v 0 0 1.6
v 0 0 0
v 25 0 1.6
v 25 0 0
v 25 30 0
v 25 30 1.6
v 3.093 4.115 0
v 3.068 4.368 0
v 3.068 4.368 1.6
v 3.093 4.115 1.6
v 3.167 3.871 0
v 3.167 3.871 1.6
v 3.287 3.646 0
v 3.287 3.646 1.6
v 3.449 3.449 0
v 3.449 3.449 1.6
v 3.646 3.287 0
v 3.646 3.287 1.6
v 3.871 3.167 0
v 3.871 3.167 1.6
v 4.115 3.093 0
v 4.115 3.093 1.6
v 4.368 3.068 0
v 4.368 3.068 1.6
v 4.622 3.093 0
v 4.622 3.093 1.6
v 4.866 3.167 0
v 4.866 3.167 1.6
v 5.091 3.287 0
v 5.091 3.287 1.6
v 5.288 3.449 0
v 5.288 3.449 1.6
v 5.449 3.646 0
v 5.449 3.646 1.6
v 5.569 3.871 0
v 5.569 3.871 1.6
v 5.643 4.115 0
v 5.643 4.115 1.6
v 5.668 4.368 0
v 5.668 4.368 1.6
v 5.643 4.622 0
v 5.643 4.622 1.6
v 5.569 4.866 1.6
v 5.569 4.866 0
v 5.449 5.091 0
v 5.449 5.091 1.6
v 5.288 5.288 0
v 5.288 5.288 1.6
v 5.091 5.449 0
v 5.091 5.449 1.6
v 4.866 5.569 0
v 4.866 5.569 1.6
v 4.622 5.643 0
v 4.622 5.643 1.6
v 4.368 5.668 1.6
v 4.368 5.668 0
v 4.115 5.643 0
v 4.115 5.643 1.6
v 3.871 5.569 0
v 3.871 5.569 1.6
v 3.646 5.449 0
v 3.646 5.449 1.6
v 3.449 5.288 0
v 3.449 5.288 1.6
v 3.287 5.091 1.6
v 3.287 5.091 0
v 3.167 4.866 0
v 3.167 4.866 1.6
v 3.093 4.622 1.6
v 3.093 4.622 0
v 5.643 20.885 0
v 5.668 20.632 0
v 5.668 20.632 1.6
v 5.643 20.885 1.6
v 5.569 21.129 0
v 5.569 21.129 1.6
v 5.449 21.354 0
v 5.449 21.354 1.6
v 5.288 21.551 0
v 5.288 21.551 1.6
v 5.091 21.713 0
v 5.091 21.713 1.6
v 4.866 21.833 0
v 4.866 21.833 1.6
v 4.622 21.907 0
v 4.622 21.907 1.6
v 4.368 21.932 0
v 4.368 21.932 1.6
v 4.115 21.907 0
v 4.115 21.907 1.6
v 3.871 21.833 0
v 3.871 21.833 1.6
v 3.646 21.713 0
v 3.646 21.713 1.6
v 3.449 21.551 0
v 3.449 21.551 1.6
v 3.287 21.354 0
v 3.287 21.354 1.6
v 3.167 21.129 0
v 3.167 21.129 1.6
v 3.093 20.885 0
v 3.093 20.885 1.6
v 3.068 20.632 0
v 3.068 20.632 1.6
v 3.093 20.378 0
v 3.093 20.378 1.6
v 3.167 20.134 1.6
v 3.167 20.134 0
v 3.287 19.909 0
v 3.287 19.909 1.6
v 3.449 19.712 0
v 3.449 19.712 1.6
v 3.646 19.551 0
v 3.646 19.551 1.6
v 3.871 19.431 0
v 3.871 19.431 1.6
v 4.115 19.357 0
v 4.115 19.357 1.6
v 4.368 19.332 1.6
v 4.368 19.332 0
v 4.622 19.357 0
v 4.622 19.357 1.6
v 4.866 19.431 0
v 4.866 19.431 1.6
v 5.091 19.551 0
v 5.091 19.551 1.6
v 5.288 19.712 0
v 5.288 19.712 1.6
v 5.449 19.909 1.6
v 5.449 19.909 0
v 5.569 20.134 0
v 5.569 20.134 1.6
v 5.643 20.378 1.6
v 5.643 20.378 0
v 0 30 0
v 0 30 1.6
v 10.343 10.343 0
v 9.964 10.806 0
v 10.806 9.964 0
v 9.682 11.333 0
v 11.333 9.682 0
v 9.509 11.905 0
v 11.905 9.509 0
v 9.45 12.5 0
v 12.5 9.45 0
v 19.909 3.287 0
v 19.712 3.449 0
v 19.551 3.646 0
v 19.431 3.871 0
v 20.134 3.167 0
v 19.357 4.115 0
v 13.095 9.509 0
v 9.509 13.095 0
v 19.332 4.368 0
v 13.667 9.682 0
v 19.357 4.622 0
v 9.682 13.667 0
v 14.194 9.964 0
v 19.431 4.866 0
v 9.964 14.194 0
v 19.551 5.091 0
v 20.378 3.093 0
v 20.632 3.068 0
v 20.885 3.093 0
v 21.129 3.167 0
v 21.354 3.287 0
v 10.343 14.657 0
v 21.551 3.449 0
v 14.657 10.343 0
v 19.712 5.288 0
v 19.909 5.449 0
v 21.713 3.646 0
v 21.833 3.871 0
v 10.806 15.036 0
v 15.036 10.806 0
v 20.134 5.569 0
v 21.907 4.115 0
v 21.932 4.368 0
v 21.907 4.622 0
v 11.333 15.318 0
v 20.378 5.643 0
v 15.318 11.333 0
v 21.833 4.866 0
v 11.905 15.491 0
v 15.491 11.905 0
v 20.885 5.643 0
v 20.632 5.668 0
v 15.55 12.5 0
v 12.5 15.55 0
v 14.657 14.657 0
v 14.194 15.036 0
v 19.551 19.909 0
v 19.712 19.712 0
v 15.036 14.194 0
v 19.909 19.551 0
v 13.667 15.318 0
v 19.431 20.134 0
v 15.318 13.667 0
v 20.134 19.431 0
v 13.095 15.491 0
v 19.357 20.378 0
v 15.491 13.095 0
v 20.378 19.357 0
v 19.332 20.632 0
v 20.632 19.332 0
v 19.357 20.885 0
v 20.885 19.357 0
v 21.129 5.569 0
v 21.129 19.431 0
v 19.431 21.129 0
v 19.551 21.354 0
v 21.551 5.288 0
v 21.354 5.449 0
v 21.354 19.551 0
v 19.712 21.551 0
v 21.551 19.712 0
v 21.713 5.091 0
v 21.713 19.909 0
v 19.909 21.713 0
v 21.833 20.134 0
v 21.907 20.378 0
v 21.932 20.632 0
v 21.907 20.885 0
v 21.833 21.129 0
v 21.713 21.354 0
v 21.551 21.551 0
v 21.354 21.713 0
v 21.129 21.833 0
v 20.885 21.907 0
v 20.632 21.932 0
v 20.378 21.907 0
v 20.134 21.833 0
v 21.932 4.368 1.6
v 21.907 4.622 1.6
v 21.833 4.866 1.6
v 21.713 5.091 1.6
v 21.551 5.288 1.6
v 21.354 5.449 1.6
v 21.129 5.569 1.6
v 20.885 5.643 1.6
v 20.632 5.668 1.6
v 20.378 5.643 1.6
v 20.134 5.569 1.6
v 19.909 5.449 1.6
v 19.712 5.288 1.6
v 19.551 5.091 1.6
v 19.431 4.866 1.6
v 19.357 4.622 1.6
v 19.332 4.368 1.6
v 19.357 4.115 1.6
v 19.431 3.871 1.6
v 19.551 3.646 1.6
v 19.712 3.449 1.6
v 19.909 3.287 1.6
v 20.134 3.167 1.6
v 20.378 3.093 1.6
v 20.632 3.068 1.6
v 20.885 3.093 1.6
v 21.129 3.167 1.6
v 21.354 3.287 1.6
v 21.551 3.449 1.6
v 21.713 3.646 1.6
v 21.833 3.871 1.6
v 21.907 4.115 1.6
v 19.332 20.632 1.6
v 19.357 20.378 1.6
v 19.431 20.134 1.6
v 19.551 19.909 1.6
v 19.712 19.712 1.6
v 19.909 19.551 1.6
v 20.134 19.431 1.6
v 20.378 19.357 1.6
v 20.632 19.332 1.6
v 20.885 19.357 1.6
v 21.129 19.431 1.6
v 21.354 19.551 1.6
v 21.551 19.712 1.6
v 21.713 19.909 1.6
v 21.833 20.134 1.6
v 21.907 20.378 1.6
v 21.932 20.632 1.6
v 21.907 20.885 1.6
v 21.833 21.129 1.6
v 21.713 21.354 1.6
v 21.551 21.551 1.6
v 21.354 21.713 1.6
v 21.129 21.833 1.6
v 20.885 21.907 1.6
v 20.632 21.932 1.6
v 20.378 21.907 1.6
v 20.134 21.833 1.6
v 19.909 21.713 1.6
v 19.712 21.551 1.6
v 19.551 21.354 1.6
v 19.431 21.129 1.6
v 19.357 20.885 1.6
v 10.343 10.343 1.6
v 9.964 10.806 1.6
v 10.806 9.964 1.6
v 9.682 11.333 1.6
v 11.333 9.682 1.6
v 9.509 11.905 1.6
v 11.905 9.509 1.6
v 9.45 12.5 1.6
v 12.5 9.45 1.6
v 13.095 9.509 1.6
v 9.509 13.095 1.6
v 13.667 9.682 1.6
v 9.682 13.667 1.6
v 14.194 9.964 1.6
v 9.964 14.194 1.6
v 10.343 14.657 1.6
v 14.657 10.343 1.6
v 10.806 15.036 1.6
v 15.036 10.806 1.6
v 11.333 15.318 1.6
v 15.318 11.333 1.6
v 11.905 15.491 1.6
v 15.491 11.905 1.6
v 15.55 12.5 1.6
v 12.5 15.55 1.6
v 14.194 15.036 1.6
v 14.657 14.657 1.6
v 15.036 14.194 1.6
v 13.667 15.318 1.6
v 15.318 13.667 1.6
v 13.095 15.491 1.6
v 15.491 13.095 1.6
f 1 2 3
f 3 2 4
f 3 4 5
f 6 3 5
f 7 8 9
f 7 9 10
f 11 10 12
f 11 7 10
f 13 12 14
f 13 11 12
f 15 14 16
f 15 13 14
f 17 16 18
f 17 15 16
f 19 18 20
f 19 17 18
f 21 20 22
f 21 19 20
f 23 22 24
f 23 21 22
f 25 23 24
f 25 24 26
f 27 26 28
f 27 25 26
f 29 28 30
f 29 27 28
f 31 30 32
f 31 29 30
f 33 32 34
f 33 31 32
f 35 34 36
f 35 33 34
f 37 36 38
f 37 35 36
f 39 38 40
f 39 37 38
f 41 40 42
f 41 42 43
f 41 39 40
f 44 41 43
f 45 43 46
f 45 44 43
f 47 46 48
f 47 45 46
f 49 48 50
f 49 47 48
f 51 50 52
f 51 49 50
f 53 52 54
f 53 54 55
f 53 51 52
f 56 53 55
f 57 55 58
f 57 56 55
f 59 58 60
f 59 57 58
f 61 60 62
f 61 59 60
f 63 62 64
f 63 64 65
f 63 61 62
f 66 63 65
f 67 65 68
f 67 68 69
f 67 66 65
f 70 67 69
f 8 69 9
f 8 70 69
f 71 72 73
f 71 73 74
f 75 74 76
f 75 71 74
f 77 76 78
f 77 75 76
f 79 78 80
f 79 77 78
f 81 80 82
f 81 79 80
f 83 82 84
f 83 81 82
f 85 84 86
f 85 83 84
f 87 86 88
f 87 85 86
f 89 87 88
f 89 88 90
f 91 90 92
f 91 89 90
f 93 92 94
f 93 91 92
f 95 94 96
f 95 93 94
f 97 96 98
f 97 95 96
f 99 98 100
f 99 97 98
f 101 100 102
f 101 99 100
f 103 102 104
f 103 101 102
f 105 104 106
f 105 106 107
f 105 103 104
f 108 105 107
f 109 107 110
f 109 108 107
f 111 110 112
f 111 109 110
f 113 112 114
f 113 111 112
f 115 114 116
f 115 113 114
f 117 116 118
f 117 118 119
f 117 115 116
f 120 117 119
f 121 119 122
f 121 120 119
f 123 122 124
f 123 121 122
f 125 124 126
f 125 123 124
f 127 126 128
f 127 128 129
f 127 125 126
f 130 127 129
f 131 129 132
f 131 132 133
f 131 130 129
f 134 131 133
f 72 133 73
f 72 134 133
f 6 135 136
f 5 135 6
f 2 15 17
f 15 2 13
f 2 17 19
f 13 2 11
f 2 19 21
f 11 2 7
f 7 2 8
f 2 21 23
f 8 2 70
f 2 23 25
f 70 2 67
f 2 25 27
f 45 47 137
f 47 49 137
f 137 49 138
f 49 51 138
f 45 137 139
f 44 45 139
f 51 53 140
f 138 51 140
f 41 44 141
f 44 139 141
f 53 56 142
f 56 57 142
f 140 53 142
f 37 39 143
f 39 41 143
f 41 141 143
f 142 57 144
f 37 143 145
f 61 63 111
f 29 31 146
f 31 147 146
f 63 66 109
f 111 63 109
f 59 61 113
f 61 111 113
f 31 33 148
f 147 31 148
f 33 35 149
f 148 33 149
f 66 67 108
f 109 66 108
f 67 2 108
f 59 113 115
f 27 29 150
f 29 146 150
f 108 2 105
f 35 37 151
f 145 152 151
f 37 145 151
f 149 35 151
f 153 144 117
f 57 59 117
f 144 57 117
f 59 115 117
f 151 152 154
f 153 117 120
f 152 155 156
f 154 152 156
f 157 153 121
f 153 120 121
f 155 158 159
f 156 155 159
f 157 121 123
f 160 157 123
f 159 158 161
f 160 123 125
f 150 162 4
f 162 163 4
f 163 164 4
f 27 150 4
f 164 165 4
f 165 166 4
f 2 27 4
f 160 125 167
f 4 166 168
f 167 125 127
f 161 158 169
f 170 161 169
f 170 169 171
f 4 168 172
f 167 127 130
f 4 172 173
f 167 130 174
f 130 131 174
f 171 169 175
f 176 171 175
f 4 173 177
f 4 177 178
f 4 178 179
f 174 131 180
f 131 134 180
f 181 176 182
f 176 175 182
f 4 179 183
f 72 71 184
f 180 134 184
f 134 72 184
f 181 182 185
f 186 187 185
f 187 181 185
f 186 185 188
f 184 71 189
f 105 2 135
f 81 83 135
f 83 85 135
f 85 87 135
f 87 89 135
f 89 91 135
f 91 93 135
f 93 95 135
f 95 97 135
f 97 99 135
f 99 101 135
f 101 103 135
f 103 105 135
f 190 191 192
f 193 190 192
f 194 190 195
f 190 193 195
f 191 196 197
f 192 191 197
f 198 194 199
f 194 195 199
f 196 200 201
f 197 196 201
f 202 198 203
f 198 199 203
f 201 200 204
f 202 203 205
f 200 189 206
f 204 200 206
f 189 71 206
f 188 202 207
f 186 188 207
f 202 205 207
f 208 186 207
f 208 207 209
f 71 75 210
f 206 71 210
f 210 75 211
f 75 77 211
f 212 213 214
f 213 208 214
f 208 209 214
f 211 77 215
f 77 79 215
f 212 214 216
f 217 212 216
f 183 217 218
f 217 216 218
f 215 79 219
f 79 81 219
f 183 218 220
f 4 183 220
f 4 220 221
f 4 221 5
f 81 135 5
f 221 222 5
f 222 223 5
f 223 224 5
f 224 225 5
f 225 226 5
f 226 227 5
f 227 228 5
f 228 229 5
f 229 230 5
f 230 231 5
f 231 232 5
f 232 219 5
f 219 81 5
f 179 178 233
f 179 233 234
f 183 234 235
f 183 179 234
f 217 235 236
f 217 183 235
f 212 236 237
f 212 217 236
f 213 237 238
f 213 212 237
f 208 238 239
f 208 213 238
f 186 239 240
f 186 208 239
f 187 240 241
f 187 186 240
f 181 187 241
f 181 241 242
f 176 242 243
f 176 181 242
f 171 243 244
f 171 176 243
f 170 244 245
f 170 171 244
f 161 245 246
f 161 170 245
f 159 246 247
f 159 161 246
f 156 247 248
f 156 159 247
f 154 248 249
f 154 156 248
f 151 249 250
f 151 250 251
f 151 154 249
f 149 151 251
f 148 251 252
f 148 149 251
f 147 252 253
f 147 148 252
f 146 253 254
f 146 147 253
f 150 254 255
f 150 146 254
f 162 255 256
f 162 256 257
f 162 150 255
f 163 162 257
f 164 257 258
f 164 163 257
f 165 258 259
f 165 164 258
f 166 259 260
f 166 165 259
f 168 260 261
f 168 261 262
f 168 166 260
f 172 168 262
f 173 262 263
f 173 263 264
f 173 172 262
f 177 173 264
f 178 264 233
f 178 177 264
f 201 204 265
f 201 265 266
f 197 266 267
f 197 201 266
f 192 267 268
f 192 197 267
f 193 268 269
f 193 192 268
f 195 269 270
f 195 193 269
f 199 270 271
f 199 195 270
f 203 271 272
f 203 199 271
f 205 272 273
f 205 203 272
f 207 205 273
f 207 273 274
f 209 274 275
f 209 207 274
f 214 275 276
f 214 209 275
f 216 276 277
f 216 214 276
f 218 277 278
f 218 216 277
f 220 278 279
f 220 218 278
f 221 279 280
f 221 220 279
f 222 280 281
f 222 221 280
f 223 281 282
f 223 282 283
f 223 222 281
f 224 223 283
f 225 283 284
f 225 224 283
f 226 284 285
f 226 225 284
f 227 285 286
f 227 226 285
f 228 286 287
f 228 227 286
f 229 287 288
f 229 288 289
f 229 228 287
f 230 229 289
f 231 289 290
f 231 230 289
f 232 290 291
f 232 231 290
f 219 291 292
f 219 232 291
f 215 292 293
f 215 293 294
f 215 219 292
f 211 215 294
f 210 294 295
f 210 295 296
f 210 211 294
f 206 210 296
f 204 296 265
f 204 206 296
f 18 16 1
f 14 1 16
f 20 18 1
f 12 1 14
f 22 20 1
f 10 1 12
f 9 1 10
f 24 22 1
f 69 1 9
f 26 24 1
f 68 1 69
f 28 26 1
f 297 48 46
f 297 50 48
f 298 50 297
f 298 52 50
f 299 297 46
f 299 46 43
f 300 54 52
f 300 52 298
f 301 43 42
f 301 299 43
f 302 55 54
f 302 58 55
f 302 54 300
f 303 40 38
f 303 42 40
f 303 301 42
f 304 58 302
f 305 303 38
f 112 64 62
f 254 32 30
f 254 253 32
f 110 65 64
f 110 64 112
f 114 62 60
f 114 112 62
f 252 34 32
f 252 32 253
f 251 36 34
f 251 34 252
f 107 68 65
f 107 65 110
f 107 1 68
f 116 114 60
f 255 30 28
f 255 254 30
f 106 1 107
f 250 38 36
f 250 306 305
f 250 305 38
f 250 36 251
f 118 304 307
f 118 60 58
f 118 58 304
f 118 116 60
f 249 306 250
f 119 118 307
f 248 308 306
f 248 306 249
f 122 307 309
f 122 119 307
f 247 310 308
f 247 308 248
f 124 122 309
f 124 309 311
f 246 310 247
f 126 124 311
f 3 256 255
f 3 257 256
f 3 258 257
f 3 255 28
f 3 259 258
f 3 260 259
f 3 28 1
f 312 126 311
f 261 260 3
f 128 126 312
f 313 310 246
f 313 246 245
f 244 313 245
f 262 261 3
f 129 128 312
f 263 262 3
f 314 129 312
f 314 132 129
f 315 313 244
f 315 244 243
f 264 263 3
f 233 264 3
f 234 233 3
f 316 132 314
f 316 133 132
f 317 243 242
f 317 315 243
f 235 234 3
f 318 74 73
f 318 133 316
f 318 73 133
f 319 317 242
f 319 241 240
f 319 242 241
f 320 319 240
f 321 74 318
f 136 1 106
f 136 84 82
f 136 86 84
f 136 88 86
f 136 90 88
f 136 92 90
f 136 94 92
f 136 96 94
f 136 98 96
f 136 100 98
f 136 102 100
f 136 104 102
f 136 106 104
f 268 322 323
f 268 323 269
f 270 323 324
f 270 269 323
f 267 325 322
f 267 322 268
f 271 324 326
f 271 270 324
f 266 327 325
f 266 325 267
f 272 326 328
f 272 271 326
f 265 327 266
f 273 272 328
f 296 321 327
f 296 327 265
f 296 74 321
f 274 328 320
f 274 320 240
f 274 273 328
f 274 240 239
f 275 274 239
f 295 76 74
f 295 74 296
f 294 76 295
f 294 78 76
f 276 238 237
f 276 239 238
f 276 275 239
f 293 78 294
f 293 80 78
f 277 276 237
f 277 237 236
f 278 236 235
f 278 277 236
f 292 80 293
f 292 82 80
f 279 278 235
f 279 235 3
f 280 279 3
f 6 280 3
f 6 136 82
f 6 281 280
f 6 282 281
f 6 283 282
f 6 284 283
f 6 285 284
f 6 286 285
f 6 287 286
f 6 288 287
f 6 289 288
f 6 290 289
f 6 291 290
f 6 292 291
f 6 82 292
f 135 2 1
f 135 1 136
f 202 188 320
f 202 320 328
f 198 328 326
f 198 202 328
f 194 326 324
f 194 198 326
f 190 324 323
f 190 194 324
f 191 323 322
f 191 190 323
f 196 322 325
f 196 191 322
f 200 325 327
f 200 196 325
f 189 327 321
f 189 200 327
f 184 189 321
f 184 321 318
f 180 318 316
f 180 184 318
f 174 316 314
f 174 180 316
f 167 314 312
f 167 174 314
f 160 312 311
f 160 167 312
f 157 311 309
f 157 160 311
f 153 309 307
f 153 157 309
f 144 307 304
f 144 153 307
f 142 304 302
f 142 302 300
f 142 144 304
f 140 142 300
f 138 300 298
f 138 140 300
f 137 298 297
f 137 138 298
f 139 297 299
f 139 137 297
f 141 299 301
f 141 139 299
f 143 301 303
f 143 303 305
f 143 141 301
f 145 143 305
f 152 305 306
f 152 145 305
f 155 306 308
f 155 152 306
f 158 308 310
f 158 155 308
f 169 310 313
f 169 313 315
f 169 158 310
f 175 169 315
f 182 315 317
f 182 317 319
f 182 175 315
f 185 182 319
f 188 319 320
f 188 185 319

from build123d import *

# Parameters (mm, degrees)
SKETCH_1_W      = 25
SKETCH_1_H      = 30
SKETCH_1_R      = 1.3
SKETCH_1_R_2    = 3.05
EXTRUDE_1_DEPTH = 1.6


with BuildPart() as part:
    # 草图1 → 凸台-拉伸1 (new body)
    with BuildSketch(Plane.XY):
        with Locations((12.5, 15)):
            Rectangle(SKETCH_1_W, SKETCH_1_H)
        with Locations((4.368272016, 20.631727984)):
            Circle(SKETCH_1_R, mode=Mode.SUBTRACT)
        with Locations(Location((20.631727984, 20.631727984, 0), (0, 0, 180))):
            Circle(SKETCH_1_R, mode=Mode.SUBTRACT)
        with Locations((20.631727984, 4.368272016)):
            Circle(SKETCH_1_R, mode=Mode.SUBTRACT)
        with Locations(Location((4.368272016, 4.368272016, 0), (0, 0, 180))):
            Circle(SKETCH_1_R, mode=Mode.SUBTRACT)
        with Locations((12.5, 12.5)):
            Circle(SKETCH_1_R_2, mode=Mode.SUBTRACT)
    extrude(amount=EXTRUDE_1_DEPTH)


solid = part.part
